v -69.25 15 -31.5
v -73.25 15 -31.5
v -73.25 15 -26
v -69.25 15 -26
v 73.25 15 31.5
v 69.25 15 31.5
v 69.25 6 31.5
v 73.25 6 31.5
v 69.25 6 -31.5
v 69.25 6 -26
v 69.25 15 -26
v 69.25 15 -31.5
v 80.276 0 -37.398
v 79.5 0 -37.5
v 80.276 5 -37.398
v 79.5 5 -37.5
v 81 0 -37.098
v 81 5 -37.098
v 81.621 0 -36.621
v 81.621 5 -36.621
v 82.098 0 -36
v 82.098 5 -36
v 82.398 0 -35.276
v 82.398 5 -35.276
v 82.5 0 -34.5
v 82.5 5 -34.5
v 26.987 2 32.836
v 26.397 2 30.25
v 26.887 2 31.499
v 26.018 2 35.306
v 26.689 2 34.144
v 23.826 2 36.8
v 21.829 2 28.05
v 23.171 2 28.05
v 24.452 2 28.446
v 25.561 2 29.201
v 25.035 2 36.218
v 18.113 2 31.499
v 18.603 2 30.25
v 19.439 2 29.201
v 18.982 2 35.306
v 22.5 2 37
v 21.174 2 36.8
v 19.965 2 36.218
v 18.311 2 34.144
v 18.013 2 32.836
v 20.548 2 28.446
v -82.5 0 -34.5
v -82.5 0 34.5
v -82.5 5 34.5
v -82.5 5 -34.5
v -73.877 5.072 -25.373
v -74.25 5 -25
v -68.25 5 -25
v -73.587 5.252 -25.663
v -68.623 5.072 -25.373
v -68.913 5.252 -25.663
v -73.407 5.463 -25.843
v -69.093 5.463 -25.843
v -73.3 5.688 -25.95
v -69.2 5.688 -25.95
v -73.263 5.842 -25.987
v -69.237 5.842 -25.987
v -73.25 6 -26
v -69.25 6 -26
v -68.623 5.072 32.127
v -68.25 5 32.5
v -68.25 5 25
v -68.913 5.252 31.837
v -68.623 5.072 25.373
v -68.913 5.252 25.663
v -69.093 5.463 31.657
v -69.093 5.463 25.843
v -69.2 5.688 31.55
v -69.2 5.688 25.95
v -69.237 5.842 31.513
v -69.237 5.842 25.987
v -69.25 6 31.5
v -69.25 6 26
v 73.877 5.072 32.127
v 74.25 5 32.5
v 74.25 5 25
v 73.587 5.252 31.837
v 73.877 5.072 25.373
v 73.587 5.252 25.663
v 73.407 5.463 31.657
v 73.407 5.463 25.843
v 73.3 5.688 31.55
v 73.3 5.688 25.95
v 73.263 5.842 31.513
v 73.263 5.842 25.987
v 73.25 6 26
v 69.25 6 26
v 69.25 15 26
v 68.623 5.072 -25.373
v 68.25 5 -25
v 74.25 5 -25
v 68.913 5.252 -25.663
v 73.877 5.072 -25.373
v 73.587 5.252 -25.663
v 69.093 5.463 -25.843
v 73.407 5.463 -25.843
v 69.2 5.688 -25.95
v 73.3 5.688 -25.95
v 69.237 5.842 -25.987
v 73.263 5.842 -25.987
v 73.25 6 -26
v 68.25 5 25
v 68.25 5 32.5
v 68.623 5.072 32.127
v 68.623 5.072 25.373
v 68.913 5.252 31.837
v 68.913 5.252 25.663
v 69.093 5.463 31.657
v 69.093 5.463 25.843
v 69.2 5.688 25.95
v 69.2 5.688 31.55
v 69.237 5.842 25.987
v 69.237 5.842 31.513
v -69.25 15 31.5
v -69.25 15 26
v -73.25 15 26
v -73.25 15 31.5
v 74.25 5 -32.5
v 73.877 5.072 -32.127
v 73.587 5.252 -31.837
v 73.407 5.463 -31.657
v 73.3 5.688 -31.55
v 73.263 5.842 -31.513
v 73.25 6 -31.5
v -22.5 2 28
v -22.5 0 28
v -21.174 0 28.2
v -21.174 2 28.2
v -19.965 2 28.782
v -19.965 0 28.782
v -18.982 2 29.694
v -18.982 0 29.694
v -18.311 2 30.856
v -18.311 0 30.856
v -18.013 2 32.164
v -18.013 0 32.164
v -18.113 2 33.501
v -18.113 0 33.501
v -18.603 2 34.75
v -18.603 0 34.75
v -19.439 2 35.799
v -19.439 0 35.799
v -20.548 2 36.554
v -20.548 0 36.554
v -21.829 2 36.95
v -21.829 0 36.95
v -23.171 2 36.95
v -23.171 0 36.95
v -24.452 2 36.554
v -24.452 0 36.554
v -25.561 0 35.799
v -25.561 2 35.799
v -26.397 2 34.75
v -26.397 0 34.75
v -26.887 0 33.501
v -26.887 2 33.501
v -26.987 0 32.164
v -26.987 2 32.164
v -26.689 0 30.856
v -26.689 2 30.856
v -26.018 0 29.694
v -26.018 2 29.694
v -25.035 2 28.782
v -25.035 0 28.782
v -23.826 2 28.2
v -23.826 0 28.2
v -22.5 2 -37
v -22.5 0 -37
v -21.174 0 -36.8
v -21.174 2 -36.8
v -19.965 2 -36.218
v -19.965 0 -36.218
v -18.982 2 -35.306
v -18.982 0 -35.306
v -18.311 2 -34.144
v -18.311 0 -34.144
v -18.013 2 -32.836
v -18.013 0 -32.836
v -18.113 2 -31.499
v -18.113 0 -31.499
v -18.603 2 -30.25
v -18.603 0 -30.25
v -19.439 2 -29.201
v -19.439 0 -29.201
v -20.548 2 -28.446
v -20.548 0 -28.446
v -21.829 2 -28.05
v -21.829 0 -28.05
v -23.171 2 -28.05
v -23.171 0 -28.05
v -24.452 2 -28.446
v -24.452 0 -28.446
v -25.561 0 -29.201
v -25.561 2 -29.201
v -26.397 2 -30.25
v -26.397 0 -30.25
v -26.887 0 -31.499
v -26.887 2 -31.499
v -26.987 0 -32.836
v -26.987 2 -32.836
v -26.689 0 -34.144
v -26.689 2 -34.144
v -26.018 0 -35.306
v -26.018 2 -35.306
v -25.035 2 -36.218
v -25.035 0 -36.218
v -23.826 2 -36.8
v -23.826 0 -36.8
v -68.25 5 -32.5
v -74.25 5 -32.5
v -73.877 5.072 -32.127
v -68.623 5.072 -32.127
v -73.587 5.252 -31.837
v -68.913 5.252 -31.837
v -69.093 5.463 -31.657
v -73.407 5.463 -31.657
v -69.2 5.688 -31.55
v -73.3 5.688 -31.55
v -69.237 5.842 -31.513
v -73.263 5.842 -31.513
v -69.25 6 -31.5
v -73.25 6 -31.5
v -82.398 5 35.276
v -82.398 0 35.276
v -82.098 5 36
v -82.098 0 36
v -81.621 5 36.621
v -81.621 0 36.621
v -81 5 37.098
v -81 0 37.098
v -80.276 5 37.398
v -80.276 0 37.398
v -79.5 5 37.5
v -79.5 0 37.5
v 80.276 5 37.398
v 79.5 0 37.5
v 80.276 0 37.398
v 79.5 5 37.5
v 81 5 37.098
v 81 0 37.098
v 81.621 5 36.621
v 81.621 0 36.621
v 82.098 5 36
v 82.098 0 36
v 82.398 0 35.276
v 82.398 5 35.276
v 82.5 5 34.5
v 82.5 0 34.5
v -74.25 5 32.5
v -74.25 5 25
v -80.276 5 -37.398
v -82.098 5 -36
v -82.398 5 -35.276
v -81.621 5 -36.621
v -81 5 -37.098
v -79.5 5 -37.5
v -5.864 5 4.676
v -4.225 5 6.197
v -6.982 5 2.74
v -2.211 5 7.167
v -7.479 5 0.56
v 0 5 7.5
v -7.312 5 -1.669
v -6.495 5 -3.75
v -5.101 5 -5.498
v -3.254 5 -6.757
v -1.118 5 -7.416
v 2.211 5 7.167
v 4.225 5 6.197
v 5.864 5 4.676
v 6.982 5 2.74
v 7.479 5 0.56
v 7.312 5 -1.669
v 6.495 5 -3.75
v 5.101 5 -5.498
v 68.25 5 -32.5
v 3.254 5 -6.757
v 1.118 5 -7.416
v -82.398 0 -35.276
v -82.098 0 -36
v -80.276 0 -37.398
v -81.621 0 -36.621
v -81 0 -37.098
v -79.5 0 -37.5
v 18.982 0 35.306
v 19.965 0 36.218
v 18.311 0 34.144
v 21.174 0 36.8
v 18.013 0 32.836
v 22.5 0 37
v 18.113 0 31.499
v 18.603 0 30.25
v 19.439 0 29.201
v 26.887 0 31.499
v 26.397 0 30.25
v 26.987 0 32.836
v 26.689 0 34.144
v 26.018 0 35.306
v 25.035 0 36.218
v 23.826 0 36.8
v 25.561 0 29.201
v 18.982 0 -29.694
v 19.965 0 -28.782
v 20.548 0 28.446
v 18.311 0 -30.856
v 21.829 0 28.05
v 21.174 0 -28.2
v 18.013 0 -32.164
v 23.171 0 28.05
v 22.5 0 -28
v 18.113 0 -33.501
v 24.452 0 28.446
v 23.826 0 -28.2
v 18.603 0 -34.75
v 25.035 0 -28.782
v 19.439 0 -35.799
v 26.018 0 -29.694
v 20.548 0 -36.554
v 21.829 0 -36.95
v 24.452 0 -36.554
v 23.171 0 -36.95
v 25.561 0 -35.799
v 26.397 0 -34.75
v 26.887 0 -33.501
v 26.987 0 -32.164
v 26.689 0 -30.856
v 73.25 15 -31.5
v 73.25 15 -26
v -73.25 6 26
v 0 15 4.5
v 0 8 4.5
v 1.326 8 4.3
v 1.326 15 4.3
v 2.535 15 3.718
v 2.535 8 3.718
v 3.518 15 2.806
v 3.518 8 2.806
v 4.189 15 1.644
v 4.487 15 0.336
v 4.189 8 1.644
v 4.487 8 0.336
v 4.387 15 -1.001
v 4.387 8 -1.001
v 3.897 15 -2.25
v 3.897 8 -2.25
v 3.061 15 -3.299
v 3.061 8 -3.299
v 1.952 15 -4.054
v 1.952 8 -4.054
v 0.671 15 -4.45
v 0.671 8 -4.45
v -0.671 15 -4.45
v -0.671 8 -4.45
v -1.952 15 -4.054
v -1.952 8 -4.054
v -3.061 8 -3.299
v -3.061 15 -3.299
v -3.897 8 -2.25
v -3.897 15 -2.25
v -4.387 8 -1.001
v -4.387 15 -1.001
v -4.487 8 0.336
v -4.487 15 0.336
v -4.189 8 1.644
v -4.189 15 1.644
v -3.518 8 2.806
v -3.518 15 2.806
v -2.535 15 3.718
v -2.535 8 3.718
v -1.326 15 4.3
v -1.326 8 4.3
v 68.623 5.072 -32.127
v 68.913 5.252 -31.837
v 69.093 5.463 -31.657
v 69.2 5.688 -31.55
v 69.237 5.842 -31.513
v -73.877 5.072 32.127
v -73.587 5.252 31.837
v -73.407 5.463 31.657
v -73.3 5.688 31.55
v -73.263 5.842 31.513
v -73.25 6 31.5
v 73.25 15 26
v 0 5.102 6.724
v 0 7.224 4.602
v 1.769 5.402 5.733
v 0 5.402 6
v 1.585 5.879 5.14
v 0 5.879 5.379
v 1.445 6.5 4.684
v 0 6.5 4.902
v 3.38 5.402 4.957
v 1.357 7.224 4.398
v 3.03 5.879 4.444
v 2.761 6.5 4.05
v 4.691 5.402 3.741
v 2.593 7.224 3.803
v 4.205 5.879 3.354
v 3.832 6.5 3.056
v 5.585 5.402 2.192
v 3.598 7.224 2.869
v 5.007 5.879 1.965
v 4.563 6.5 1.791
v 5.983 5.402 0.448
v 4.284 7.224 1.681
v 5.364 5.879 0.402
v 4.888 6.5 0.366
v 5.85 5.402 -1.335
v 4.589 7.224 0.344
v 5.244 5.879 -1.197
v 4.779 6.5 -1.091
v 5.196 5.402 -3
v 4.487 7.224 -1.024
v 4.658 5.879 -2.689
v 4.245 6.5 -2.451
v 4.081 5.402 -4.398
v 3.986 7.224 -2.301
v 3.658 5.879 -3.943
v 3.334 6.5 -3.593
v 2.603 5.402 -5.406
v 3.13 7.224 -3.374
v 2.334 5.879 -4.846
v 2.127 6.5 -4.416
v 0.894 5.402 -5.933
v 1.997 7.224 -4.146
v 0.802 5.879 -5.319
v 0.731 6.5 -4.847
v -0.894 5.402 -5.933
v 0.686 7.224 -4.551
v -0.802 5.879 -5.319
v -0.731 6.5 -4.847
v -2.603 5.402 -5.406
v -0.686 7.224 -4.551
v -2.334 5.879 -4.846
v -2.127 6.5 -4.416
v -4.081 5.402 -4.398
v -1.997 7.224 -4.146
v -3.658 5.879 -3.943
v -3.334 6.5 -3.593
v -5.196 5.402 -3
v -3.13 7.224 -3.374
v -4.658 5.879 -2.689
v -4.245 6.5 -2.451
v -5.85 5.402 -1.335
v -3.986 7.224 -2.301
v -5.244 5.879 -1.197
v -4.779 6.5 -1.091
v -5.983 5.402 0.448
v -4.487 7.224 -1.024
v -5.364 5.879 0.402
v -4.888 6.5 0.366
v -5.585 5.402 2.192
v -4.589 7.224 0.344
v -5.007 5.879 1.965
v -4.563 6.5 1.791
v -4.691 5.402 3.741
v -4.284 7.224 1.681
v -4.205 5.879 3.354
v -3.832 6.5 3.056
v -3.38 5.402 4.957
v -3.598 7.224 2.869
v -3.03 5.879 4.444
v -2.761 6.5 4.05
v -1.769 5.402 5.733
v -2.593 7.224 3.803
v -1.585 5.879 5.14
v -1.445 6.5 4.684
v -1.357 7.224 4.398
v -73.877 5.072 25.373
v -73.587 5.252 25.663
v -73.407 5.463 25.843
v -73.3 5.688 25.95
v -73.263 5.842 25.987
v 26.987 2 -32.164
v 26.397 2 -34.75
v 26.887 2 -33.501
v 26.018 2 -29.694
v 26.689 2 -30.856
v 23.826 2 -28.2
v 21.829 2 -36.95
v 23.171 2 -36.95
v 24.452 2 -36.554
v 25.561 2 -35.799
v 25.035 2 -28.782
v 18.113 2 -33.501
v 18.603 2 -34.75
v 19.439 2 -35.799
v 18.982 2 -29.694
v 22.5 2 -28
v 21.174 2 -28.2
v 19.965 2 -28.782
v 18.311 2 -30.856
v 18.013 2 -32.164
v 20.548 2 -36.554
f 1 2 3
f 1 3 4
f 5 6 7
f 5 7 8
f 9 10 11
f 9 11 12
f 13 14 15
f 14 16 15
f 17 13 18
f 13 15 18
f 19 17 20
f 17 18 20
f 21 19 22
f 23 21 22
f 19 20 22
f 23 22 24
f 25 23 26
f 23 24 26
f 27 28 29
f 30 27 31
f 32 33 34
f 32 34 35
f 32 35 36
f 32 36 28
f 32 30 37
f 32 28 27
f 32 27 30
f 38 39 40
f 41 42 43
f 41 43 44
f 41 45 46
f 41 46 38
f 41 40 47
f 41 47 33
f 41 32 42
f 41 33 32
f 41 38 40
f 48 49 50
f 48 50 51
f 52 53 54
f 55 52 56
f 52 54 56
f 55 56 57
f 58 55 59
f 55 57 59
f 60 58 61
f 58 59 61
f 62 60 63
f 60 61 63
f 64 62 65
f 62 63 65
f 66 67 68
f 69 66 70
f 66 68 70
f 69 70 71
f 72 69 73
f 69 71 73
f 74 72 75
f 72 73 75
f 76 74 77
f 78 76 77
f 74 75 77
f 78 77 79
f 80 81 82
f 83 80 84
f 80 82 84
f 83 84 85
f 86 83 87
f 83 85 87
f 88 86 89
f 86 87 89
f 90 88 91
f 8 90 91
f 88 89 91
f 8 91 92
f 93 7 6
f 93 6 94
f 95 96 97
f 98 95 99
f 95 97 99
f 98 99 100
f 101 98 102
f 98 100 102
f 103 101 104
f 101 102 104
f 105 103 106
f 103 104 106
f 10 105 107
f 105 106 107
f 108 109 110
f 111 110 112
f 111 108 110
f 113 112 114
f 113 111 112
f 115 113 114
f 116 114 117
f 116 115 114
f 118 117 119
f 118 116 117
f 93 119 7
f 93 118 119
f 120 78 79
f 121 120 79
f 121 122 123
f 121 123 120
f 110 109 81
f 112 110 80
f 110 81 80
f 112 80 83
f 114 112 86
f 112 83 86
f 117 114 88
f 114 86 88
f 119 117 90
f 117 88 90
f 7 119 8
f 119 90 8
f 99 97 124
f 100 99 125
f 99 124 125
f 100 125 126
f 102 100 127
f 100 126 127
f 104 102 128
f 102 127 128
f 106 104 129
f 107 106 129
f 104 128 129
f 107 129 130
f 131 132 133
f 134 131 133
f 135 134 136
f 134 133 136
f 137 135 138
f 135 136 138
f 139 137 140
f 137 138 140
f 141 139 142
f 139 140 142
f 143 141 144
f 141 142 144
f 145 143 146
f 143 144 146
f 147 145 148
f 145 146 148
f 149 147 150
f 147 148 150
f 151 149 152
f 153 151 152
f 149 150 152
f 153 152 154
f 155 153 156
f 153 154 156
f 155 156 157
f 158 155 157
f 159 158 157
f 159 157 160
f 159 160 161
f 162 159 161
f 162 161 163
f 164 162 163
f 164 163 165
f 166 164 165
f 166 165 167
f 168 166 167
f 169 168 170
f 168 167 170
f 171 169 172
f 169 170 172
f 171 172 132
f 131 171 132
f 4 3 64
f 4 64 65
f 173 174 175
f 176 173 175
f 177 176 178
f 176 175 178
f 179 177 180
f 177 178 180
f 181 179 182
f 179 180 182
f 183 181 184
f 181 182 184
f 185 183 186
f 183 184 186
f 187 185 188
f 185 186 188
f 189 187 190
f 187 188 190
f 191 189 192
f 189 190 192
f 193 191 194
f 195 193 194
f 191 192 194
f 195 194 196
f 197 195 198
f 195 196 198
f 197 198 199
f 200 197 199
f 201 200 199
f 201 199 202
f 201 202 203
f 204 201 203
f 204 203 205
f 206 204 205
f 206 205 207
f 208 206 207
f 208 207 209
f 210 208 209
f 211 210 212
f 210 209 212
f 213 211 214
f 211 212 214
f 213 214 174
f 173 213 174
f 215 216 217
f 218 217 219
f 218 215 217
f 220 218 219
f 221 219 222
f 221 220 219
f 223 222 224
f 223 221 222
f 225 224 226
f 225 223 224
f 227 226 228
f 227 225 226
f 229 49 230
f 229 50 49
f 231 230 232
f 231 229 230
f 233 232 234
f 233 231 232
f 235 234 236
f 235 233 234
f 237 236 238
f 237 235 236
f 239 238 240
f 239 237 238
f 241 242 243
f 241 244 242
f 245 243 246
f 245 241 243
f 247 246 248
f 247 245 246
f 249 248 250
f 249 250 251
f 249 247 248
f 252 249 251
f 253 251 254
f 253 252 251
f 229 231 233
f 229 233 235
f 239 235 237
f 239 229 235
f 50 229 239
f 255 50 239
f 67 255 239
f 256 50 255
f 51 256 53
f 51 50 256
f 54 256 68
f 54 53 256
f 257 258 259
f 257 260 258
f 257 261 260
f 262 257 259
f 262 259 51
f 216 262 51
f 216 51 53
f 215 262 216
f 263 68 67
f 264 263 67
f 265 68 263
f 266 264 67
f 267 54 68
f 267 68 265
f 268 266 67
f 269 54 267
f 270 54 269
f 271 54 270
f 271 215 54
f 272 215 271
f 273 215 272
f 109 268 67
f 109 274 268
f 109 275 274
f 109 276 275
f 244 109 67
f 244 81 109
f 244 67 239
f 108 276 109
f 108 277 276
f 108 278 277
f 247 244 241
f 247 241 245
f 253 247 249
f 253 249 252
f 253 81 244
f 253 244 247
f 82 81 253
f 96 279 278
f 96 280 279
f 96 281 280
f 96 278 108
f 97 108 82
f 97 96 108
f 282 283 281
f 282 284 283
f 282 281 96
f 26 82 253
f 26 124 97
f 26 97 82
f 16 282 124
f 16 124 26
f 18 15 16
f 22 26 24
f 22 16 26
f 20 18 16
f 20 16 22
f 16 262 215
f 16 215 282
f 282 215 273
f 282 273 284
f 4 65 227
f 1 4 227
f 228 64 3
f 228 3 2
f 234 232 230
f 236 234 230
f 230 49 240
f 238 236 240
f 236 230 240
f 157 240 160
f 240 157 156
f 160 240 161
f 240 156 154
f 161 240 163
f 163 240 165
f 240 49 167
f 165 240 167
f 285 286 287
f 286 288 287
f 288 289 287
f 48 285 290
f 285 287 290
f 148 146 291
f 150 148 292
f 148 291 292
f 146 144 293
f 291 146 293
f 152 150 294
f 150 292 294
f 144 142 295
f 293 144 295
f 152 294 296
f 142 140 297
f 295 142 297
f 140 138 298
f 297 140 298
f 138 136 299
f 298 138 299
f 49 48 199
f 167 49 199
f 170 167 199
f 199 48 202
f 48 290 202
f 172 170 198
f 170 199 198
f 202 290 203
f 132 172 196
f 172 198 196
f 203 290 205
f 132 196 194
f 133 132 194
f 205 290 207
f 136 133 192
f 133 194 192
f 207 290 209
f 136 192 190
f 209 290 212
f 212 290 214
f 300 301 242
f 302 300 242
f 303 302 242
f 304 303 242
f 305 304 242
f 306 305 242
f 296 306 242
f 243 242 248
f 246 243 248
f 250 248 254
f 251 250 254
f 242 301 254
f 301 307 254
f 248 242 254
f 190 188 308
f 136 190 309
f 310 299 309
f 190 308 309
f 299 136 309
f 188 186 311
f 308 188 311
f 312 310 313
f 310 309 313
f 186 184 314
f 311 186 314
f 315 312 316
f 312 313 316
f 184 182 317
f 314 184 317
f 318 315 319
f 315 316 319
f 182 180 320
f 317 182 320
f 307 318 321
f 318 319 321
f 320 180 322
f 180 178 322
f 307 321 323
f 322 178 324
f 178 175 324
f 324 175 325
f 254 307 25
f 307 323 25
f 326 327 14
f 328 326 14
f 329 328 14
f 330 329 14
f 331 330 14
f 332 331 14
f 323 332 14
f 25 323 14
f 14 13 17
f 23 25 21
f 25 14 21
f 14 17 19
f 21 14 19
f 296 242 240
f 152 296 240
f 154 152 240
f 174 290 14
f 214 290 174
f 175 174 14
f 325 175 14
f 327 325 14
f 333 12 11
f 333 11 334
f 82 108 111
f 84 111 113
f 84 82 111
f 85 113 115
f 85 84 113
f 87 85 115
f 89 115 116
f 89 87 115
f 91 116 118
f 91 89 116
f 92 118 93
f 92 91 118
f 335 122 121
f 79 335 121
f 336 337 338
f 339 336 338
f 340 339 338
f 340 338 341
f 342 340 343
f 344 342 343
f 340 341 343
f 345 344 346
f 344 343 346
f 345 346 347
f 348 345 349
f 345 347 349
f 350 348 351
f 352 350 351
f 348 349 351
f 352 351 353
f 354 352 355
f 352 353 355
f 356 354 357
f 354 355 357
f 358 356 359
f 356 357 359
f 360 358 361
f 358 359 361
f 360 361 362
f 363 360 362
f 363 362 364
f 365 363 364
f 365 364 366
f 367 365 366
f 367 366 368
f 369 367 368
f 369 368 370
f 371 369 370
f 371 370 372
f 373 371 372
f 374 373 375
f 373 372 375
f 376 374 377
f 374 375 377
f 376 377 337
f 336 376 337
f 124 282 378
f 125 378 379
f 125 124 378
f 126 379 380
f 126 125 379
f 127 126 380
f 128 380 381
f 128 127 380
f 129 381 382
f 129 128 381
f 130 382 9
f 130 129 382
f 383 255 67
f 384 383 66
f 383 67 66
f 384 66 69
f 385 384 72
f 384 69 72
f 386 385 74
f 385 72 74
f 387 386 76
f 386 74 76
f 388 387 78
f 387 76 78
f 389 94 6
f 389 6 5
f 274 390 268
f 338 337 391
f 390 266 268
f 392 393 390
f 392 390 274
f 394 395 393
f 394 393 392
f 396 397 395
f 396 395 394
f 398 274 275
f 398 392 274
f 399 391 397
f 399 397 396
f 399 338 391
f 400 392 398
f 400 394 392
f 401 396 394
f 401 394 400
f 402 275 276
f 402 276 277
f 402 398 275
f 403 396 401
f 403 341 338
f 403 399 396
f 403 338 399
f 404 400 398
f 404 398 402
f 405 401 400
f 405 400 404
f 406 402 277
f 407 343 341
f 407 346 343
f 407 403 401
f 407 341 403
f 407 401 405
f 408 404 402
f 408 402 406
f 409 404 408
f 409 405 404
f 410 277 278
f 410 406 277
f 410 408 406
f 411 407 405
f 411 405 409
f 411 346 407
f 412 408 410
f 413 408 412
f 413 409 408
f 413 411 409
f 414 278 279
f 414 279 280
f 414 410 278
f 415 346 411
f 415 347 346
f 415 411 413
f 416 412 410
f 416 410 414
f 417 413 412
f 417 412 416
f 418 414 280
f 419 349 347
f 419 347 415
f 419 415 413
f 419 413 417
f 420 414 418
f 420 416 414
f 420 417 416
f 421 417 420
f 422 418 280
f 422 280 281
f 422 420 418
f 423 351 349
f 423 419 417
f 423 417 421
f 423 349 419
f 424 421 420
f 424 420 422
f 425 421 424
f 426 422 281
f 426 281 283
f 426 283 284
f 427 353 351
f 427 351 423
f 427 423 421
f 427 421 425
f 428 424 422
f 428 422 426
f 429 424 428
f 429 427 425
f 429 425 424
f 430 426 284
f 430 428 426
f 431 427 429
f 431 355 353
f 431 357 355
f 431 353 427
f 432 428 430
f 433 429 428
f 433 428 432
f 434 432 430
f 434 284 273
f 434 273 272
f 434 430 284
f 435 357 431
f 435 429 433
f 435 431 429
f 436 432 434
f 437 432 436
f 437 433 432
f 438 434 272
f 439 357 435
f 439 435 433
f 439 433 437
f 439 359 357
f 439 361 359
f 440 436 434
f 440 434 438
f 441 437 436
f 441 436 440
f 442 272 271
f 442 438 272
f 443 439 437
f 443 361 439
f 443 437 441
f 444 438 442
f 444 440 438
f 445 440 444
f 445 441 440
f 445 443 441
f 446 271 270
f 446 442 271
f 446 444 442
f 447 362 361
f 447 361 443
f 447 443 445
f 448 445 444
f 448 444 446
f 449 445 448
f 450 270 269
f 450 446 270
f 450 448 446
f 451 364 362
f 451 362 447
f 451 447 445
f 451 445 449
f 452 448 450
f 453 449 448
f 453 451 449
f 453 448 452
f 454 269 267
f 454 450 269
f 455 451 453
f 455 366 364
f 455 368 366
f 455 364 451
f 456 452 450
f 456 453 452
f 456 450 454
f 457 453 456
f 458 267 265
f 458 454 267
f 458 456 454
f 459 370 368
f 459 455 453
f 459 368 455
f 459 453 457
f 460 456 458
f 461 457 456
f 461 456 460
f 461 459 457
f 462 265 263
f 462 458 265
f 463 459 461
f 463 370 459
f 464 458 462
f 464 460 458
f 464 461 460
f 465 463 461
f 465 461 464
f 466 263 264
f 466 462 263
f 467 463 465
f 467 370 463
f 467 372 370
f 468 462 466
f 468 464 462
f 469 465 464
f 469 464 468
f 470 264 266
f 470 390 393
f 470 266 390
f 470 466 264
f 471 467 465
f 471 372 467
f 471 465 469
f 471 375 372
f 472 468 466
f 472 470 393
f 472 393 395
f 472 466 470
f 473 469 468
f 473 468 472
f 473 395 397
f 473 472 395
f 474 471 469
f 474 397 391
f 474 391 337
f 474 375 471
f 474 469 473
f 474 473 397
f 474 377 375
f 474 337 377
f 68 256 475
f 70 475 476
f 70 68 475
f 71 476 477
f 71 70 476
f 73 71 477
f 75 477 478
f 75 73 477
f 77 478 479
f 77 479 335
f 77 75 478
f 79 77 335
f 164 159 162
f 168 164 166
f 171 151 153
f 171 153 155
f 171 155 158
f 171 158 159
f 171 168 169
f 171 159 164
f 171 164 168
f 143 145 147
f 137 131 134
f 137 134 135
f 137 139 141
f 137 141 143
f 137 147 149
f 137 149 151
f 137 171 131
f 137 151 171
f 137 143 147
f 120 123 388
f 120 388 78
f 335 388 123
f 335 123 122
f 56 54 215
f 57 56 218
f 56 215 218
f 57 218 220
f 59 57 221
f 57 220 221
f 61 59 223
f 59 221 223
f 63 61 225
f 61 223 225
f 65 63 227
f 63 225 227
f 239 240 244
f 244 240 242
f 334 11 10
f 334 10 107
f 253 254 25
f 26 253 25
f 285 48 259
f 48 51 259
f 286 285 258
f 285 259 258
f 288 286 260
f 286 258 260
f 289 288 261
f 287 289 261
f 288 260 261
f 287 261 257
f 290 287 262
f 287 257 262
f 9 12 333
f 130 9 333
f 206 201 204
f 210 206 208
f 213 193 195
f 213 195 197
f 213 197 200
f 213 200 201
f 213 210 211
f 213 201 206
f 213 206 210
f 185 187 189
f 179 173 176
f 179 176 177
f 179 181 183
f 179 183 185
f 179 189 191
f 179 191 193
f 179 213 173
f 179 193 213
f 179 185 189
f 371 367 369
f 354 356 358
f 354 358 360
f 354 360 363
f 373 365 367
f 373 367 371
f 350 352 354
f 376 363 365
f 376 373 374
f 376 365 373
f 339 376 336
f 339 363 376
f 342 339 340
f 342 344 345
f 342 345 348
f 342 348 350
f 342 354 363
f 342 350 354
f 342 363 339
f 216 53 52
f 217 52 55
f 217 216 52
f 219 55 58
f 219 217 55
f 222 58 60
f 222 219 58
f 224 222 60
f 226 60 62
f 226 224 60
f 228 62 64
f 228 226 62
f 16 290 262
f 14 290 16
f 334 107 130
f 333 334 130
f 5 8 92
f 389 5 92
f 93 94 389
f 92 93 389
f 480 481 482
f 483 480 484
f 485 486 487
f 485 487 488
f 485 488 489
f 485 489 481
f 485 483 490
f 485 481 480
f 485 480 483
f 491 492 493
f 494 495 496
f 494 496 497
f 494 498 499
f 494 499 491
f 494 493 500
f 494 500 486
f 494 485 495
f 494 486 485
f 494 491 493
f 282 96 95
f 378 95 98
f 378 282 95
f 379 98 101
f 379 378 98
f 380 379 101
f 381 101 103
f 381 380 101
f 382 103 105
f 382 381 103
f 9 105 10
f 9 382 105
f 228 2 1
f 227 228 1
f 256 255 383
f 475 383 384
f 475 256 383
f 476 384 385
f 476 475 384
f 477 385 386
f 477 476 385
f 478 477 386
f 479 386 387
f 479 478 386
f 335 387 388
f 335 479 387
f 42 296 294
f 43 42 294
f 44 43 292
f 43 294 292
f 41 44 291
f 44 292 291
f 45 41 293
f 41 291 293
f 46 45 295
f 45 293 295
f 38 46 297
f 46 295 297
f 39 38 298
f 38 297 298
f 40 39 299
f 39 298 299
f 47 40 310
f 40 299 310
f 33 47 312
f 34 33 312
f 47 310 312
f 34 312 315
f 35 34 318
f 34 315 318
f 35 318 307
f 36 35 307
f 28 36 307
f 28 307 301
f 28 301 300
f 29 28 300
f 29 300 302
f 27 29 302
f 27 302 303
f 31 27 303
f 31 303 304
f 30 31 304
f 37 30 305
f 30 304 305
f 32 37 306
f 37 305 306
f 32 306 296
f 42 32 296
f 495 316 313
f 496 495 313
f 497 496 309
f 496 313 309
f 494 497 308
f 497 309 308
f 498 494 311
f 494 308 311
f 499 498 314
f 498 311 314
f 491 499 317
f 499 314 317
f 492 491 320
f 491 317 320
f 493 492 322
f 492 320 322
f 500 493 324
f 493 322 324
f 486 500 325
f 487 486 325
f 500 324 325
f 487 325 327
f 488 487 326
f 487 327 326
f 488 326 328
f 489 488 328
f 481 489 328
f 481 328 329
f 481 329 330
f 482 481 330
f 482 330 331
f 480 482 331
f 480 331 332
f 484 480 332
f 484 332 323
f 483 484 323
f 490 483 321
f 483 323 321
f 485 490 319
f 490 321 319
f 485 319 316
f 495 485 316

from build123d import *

# Parameters (mm, degrees)
SKETCH1_W           = 165
SKETCH1_H           = 75
BOSS_EXTRUDE1_DEPTH = 5
SKETCH3_W           = 4
SKETCH3_H           = 5.5
SKETCH3_R           = 4.5
BOSS_EXTRUDE3_DEPTH = 10
FILLET2_R           = 3
FILLET4_R           = 3
FILLET5_R           = 1
SKETCH4_R           = 4.5
CUT_EXTRUDE1_DEPTH  = 2


with BuildPart() as part:
    # Sketch1 → Boss-Extrude1 (new body)
    with BuildSketch(Plane(origin=(0, 0, 0), x_dir=(1, 0, 0), z_dir=(0, 1, 0))):
        Rectangle(SKETCH1_W, SKETCH1_H)
    extrude(amount=BOSS_EXTRUDE1_DEPTH)

    # Sketch3 → Boss-Extrude3 (add)
    with BuildSketch(Plane(origin=(0, 5, 0), x_dir=(1, 0, 0), z_dir=(0, 1, 0))):
        with Locations((-71.25, 28.75)):
            Rectangle(SKETCH3_W, SKETCH3_H)
        with Locations((-71.25, -28.75)):
            Rectangle(SKETCH3_W, SKETCH3_H)
        with Locations((71.25, -28.75)):
            Rectangle(SKETCH3_W, SKETCH3_H)
        with Locations((71.25, 28.75)):
            Rectangle(SKETCH3_W, SKETCH3_H)
        Circle(SKETCH3_R)
    extrude(amount=BOSS_EXTRUDE3_DEPTH)

    # Fillet2
    fillet2_edges = [part.edges().sort_by_distance(p)[0] for p in [
        (-4.5, 5, 0),
    ]]
    fillet(fillet2_edges, radius=FILLET2_R)

    # Fillet4
    fillet4_edges = [part.edges().sort_by_distance(p)[0] for p in [
        (-82.5, 2.5, -37.5),
        (82.5, 2.5, 37.5),
        (82.5, 2.5, -37.5),
        (-82.5, 2.5, 37.5),
    ]]
    fillet(fillet4_edges, radius=FILLET4_R)

    # Fillet5
    fillet5_edges = [part.edges().sort_by_distance(p)[0] for p in [
        (-73.25, 5, 28.75),
        (-71.25, 5, 26),
        (-69.25, 5, 28.75),
        (-71.25, 5, 31.5),
        (-71.25, 5, -26),
        (-73.25, 5, -28.75),
        (-71.25, 5, -31.5),
        (-69.25, 5, -28.75),
        (73.25, 5, -28.75),
        (71.25, 5, -31.5),
        (69.25, 5, -28.75),
        (71.25, 5, -26),
        (71.25, 5, 31.5),
        (69.25, 5, 28.75),
        (73.25, 5, 28.75),
        (71.25, 5, 26),
    ]]
    fillet(fillet5_edges, radius=FILLET5_R)

    # Sketch4 → Cut-Extrude1 (cut)
    with BuildSketch(Plane.XZ):
        with Locations((-22.5, -32.5)):
            Circle(SKETCH4_R)
        with Locations((-22.5, 32.5)):
            Circle(SKETCH4_R)
        with Locations((22.5, 32.5)):
            Circle(SKETCH4_R)
        with Locations((22.5, -32.5)):
            Circle(SKETCH4_R)
    extrude(amount=-CUT_EXTRUDE1_DEPTH, mode=Mode.SUBTRACT)


solid = part.part
